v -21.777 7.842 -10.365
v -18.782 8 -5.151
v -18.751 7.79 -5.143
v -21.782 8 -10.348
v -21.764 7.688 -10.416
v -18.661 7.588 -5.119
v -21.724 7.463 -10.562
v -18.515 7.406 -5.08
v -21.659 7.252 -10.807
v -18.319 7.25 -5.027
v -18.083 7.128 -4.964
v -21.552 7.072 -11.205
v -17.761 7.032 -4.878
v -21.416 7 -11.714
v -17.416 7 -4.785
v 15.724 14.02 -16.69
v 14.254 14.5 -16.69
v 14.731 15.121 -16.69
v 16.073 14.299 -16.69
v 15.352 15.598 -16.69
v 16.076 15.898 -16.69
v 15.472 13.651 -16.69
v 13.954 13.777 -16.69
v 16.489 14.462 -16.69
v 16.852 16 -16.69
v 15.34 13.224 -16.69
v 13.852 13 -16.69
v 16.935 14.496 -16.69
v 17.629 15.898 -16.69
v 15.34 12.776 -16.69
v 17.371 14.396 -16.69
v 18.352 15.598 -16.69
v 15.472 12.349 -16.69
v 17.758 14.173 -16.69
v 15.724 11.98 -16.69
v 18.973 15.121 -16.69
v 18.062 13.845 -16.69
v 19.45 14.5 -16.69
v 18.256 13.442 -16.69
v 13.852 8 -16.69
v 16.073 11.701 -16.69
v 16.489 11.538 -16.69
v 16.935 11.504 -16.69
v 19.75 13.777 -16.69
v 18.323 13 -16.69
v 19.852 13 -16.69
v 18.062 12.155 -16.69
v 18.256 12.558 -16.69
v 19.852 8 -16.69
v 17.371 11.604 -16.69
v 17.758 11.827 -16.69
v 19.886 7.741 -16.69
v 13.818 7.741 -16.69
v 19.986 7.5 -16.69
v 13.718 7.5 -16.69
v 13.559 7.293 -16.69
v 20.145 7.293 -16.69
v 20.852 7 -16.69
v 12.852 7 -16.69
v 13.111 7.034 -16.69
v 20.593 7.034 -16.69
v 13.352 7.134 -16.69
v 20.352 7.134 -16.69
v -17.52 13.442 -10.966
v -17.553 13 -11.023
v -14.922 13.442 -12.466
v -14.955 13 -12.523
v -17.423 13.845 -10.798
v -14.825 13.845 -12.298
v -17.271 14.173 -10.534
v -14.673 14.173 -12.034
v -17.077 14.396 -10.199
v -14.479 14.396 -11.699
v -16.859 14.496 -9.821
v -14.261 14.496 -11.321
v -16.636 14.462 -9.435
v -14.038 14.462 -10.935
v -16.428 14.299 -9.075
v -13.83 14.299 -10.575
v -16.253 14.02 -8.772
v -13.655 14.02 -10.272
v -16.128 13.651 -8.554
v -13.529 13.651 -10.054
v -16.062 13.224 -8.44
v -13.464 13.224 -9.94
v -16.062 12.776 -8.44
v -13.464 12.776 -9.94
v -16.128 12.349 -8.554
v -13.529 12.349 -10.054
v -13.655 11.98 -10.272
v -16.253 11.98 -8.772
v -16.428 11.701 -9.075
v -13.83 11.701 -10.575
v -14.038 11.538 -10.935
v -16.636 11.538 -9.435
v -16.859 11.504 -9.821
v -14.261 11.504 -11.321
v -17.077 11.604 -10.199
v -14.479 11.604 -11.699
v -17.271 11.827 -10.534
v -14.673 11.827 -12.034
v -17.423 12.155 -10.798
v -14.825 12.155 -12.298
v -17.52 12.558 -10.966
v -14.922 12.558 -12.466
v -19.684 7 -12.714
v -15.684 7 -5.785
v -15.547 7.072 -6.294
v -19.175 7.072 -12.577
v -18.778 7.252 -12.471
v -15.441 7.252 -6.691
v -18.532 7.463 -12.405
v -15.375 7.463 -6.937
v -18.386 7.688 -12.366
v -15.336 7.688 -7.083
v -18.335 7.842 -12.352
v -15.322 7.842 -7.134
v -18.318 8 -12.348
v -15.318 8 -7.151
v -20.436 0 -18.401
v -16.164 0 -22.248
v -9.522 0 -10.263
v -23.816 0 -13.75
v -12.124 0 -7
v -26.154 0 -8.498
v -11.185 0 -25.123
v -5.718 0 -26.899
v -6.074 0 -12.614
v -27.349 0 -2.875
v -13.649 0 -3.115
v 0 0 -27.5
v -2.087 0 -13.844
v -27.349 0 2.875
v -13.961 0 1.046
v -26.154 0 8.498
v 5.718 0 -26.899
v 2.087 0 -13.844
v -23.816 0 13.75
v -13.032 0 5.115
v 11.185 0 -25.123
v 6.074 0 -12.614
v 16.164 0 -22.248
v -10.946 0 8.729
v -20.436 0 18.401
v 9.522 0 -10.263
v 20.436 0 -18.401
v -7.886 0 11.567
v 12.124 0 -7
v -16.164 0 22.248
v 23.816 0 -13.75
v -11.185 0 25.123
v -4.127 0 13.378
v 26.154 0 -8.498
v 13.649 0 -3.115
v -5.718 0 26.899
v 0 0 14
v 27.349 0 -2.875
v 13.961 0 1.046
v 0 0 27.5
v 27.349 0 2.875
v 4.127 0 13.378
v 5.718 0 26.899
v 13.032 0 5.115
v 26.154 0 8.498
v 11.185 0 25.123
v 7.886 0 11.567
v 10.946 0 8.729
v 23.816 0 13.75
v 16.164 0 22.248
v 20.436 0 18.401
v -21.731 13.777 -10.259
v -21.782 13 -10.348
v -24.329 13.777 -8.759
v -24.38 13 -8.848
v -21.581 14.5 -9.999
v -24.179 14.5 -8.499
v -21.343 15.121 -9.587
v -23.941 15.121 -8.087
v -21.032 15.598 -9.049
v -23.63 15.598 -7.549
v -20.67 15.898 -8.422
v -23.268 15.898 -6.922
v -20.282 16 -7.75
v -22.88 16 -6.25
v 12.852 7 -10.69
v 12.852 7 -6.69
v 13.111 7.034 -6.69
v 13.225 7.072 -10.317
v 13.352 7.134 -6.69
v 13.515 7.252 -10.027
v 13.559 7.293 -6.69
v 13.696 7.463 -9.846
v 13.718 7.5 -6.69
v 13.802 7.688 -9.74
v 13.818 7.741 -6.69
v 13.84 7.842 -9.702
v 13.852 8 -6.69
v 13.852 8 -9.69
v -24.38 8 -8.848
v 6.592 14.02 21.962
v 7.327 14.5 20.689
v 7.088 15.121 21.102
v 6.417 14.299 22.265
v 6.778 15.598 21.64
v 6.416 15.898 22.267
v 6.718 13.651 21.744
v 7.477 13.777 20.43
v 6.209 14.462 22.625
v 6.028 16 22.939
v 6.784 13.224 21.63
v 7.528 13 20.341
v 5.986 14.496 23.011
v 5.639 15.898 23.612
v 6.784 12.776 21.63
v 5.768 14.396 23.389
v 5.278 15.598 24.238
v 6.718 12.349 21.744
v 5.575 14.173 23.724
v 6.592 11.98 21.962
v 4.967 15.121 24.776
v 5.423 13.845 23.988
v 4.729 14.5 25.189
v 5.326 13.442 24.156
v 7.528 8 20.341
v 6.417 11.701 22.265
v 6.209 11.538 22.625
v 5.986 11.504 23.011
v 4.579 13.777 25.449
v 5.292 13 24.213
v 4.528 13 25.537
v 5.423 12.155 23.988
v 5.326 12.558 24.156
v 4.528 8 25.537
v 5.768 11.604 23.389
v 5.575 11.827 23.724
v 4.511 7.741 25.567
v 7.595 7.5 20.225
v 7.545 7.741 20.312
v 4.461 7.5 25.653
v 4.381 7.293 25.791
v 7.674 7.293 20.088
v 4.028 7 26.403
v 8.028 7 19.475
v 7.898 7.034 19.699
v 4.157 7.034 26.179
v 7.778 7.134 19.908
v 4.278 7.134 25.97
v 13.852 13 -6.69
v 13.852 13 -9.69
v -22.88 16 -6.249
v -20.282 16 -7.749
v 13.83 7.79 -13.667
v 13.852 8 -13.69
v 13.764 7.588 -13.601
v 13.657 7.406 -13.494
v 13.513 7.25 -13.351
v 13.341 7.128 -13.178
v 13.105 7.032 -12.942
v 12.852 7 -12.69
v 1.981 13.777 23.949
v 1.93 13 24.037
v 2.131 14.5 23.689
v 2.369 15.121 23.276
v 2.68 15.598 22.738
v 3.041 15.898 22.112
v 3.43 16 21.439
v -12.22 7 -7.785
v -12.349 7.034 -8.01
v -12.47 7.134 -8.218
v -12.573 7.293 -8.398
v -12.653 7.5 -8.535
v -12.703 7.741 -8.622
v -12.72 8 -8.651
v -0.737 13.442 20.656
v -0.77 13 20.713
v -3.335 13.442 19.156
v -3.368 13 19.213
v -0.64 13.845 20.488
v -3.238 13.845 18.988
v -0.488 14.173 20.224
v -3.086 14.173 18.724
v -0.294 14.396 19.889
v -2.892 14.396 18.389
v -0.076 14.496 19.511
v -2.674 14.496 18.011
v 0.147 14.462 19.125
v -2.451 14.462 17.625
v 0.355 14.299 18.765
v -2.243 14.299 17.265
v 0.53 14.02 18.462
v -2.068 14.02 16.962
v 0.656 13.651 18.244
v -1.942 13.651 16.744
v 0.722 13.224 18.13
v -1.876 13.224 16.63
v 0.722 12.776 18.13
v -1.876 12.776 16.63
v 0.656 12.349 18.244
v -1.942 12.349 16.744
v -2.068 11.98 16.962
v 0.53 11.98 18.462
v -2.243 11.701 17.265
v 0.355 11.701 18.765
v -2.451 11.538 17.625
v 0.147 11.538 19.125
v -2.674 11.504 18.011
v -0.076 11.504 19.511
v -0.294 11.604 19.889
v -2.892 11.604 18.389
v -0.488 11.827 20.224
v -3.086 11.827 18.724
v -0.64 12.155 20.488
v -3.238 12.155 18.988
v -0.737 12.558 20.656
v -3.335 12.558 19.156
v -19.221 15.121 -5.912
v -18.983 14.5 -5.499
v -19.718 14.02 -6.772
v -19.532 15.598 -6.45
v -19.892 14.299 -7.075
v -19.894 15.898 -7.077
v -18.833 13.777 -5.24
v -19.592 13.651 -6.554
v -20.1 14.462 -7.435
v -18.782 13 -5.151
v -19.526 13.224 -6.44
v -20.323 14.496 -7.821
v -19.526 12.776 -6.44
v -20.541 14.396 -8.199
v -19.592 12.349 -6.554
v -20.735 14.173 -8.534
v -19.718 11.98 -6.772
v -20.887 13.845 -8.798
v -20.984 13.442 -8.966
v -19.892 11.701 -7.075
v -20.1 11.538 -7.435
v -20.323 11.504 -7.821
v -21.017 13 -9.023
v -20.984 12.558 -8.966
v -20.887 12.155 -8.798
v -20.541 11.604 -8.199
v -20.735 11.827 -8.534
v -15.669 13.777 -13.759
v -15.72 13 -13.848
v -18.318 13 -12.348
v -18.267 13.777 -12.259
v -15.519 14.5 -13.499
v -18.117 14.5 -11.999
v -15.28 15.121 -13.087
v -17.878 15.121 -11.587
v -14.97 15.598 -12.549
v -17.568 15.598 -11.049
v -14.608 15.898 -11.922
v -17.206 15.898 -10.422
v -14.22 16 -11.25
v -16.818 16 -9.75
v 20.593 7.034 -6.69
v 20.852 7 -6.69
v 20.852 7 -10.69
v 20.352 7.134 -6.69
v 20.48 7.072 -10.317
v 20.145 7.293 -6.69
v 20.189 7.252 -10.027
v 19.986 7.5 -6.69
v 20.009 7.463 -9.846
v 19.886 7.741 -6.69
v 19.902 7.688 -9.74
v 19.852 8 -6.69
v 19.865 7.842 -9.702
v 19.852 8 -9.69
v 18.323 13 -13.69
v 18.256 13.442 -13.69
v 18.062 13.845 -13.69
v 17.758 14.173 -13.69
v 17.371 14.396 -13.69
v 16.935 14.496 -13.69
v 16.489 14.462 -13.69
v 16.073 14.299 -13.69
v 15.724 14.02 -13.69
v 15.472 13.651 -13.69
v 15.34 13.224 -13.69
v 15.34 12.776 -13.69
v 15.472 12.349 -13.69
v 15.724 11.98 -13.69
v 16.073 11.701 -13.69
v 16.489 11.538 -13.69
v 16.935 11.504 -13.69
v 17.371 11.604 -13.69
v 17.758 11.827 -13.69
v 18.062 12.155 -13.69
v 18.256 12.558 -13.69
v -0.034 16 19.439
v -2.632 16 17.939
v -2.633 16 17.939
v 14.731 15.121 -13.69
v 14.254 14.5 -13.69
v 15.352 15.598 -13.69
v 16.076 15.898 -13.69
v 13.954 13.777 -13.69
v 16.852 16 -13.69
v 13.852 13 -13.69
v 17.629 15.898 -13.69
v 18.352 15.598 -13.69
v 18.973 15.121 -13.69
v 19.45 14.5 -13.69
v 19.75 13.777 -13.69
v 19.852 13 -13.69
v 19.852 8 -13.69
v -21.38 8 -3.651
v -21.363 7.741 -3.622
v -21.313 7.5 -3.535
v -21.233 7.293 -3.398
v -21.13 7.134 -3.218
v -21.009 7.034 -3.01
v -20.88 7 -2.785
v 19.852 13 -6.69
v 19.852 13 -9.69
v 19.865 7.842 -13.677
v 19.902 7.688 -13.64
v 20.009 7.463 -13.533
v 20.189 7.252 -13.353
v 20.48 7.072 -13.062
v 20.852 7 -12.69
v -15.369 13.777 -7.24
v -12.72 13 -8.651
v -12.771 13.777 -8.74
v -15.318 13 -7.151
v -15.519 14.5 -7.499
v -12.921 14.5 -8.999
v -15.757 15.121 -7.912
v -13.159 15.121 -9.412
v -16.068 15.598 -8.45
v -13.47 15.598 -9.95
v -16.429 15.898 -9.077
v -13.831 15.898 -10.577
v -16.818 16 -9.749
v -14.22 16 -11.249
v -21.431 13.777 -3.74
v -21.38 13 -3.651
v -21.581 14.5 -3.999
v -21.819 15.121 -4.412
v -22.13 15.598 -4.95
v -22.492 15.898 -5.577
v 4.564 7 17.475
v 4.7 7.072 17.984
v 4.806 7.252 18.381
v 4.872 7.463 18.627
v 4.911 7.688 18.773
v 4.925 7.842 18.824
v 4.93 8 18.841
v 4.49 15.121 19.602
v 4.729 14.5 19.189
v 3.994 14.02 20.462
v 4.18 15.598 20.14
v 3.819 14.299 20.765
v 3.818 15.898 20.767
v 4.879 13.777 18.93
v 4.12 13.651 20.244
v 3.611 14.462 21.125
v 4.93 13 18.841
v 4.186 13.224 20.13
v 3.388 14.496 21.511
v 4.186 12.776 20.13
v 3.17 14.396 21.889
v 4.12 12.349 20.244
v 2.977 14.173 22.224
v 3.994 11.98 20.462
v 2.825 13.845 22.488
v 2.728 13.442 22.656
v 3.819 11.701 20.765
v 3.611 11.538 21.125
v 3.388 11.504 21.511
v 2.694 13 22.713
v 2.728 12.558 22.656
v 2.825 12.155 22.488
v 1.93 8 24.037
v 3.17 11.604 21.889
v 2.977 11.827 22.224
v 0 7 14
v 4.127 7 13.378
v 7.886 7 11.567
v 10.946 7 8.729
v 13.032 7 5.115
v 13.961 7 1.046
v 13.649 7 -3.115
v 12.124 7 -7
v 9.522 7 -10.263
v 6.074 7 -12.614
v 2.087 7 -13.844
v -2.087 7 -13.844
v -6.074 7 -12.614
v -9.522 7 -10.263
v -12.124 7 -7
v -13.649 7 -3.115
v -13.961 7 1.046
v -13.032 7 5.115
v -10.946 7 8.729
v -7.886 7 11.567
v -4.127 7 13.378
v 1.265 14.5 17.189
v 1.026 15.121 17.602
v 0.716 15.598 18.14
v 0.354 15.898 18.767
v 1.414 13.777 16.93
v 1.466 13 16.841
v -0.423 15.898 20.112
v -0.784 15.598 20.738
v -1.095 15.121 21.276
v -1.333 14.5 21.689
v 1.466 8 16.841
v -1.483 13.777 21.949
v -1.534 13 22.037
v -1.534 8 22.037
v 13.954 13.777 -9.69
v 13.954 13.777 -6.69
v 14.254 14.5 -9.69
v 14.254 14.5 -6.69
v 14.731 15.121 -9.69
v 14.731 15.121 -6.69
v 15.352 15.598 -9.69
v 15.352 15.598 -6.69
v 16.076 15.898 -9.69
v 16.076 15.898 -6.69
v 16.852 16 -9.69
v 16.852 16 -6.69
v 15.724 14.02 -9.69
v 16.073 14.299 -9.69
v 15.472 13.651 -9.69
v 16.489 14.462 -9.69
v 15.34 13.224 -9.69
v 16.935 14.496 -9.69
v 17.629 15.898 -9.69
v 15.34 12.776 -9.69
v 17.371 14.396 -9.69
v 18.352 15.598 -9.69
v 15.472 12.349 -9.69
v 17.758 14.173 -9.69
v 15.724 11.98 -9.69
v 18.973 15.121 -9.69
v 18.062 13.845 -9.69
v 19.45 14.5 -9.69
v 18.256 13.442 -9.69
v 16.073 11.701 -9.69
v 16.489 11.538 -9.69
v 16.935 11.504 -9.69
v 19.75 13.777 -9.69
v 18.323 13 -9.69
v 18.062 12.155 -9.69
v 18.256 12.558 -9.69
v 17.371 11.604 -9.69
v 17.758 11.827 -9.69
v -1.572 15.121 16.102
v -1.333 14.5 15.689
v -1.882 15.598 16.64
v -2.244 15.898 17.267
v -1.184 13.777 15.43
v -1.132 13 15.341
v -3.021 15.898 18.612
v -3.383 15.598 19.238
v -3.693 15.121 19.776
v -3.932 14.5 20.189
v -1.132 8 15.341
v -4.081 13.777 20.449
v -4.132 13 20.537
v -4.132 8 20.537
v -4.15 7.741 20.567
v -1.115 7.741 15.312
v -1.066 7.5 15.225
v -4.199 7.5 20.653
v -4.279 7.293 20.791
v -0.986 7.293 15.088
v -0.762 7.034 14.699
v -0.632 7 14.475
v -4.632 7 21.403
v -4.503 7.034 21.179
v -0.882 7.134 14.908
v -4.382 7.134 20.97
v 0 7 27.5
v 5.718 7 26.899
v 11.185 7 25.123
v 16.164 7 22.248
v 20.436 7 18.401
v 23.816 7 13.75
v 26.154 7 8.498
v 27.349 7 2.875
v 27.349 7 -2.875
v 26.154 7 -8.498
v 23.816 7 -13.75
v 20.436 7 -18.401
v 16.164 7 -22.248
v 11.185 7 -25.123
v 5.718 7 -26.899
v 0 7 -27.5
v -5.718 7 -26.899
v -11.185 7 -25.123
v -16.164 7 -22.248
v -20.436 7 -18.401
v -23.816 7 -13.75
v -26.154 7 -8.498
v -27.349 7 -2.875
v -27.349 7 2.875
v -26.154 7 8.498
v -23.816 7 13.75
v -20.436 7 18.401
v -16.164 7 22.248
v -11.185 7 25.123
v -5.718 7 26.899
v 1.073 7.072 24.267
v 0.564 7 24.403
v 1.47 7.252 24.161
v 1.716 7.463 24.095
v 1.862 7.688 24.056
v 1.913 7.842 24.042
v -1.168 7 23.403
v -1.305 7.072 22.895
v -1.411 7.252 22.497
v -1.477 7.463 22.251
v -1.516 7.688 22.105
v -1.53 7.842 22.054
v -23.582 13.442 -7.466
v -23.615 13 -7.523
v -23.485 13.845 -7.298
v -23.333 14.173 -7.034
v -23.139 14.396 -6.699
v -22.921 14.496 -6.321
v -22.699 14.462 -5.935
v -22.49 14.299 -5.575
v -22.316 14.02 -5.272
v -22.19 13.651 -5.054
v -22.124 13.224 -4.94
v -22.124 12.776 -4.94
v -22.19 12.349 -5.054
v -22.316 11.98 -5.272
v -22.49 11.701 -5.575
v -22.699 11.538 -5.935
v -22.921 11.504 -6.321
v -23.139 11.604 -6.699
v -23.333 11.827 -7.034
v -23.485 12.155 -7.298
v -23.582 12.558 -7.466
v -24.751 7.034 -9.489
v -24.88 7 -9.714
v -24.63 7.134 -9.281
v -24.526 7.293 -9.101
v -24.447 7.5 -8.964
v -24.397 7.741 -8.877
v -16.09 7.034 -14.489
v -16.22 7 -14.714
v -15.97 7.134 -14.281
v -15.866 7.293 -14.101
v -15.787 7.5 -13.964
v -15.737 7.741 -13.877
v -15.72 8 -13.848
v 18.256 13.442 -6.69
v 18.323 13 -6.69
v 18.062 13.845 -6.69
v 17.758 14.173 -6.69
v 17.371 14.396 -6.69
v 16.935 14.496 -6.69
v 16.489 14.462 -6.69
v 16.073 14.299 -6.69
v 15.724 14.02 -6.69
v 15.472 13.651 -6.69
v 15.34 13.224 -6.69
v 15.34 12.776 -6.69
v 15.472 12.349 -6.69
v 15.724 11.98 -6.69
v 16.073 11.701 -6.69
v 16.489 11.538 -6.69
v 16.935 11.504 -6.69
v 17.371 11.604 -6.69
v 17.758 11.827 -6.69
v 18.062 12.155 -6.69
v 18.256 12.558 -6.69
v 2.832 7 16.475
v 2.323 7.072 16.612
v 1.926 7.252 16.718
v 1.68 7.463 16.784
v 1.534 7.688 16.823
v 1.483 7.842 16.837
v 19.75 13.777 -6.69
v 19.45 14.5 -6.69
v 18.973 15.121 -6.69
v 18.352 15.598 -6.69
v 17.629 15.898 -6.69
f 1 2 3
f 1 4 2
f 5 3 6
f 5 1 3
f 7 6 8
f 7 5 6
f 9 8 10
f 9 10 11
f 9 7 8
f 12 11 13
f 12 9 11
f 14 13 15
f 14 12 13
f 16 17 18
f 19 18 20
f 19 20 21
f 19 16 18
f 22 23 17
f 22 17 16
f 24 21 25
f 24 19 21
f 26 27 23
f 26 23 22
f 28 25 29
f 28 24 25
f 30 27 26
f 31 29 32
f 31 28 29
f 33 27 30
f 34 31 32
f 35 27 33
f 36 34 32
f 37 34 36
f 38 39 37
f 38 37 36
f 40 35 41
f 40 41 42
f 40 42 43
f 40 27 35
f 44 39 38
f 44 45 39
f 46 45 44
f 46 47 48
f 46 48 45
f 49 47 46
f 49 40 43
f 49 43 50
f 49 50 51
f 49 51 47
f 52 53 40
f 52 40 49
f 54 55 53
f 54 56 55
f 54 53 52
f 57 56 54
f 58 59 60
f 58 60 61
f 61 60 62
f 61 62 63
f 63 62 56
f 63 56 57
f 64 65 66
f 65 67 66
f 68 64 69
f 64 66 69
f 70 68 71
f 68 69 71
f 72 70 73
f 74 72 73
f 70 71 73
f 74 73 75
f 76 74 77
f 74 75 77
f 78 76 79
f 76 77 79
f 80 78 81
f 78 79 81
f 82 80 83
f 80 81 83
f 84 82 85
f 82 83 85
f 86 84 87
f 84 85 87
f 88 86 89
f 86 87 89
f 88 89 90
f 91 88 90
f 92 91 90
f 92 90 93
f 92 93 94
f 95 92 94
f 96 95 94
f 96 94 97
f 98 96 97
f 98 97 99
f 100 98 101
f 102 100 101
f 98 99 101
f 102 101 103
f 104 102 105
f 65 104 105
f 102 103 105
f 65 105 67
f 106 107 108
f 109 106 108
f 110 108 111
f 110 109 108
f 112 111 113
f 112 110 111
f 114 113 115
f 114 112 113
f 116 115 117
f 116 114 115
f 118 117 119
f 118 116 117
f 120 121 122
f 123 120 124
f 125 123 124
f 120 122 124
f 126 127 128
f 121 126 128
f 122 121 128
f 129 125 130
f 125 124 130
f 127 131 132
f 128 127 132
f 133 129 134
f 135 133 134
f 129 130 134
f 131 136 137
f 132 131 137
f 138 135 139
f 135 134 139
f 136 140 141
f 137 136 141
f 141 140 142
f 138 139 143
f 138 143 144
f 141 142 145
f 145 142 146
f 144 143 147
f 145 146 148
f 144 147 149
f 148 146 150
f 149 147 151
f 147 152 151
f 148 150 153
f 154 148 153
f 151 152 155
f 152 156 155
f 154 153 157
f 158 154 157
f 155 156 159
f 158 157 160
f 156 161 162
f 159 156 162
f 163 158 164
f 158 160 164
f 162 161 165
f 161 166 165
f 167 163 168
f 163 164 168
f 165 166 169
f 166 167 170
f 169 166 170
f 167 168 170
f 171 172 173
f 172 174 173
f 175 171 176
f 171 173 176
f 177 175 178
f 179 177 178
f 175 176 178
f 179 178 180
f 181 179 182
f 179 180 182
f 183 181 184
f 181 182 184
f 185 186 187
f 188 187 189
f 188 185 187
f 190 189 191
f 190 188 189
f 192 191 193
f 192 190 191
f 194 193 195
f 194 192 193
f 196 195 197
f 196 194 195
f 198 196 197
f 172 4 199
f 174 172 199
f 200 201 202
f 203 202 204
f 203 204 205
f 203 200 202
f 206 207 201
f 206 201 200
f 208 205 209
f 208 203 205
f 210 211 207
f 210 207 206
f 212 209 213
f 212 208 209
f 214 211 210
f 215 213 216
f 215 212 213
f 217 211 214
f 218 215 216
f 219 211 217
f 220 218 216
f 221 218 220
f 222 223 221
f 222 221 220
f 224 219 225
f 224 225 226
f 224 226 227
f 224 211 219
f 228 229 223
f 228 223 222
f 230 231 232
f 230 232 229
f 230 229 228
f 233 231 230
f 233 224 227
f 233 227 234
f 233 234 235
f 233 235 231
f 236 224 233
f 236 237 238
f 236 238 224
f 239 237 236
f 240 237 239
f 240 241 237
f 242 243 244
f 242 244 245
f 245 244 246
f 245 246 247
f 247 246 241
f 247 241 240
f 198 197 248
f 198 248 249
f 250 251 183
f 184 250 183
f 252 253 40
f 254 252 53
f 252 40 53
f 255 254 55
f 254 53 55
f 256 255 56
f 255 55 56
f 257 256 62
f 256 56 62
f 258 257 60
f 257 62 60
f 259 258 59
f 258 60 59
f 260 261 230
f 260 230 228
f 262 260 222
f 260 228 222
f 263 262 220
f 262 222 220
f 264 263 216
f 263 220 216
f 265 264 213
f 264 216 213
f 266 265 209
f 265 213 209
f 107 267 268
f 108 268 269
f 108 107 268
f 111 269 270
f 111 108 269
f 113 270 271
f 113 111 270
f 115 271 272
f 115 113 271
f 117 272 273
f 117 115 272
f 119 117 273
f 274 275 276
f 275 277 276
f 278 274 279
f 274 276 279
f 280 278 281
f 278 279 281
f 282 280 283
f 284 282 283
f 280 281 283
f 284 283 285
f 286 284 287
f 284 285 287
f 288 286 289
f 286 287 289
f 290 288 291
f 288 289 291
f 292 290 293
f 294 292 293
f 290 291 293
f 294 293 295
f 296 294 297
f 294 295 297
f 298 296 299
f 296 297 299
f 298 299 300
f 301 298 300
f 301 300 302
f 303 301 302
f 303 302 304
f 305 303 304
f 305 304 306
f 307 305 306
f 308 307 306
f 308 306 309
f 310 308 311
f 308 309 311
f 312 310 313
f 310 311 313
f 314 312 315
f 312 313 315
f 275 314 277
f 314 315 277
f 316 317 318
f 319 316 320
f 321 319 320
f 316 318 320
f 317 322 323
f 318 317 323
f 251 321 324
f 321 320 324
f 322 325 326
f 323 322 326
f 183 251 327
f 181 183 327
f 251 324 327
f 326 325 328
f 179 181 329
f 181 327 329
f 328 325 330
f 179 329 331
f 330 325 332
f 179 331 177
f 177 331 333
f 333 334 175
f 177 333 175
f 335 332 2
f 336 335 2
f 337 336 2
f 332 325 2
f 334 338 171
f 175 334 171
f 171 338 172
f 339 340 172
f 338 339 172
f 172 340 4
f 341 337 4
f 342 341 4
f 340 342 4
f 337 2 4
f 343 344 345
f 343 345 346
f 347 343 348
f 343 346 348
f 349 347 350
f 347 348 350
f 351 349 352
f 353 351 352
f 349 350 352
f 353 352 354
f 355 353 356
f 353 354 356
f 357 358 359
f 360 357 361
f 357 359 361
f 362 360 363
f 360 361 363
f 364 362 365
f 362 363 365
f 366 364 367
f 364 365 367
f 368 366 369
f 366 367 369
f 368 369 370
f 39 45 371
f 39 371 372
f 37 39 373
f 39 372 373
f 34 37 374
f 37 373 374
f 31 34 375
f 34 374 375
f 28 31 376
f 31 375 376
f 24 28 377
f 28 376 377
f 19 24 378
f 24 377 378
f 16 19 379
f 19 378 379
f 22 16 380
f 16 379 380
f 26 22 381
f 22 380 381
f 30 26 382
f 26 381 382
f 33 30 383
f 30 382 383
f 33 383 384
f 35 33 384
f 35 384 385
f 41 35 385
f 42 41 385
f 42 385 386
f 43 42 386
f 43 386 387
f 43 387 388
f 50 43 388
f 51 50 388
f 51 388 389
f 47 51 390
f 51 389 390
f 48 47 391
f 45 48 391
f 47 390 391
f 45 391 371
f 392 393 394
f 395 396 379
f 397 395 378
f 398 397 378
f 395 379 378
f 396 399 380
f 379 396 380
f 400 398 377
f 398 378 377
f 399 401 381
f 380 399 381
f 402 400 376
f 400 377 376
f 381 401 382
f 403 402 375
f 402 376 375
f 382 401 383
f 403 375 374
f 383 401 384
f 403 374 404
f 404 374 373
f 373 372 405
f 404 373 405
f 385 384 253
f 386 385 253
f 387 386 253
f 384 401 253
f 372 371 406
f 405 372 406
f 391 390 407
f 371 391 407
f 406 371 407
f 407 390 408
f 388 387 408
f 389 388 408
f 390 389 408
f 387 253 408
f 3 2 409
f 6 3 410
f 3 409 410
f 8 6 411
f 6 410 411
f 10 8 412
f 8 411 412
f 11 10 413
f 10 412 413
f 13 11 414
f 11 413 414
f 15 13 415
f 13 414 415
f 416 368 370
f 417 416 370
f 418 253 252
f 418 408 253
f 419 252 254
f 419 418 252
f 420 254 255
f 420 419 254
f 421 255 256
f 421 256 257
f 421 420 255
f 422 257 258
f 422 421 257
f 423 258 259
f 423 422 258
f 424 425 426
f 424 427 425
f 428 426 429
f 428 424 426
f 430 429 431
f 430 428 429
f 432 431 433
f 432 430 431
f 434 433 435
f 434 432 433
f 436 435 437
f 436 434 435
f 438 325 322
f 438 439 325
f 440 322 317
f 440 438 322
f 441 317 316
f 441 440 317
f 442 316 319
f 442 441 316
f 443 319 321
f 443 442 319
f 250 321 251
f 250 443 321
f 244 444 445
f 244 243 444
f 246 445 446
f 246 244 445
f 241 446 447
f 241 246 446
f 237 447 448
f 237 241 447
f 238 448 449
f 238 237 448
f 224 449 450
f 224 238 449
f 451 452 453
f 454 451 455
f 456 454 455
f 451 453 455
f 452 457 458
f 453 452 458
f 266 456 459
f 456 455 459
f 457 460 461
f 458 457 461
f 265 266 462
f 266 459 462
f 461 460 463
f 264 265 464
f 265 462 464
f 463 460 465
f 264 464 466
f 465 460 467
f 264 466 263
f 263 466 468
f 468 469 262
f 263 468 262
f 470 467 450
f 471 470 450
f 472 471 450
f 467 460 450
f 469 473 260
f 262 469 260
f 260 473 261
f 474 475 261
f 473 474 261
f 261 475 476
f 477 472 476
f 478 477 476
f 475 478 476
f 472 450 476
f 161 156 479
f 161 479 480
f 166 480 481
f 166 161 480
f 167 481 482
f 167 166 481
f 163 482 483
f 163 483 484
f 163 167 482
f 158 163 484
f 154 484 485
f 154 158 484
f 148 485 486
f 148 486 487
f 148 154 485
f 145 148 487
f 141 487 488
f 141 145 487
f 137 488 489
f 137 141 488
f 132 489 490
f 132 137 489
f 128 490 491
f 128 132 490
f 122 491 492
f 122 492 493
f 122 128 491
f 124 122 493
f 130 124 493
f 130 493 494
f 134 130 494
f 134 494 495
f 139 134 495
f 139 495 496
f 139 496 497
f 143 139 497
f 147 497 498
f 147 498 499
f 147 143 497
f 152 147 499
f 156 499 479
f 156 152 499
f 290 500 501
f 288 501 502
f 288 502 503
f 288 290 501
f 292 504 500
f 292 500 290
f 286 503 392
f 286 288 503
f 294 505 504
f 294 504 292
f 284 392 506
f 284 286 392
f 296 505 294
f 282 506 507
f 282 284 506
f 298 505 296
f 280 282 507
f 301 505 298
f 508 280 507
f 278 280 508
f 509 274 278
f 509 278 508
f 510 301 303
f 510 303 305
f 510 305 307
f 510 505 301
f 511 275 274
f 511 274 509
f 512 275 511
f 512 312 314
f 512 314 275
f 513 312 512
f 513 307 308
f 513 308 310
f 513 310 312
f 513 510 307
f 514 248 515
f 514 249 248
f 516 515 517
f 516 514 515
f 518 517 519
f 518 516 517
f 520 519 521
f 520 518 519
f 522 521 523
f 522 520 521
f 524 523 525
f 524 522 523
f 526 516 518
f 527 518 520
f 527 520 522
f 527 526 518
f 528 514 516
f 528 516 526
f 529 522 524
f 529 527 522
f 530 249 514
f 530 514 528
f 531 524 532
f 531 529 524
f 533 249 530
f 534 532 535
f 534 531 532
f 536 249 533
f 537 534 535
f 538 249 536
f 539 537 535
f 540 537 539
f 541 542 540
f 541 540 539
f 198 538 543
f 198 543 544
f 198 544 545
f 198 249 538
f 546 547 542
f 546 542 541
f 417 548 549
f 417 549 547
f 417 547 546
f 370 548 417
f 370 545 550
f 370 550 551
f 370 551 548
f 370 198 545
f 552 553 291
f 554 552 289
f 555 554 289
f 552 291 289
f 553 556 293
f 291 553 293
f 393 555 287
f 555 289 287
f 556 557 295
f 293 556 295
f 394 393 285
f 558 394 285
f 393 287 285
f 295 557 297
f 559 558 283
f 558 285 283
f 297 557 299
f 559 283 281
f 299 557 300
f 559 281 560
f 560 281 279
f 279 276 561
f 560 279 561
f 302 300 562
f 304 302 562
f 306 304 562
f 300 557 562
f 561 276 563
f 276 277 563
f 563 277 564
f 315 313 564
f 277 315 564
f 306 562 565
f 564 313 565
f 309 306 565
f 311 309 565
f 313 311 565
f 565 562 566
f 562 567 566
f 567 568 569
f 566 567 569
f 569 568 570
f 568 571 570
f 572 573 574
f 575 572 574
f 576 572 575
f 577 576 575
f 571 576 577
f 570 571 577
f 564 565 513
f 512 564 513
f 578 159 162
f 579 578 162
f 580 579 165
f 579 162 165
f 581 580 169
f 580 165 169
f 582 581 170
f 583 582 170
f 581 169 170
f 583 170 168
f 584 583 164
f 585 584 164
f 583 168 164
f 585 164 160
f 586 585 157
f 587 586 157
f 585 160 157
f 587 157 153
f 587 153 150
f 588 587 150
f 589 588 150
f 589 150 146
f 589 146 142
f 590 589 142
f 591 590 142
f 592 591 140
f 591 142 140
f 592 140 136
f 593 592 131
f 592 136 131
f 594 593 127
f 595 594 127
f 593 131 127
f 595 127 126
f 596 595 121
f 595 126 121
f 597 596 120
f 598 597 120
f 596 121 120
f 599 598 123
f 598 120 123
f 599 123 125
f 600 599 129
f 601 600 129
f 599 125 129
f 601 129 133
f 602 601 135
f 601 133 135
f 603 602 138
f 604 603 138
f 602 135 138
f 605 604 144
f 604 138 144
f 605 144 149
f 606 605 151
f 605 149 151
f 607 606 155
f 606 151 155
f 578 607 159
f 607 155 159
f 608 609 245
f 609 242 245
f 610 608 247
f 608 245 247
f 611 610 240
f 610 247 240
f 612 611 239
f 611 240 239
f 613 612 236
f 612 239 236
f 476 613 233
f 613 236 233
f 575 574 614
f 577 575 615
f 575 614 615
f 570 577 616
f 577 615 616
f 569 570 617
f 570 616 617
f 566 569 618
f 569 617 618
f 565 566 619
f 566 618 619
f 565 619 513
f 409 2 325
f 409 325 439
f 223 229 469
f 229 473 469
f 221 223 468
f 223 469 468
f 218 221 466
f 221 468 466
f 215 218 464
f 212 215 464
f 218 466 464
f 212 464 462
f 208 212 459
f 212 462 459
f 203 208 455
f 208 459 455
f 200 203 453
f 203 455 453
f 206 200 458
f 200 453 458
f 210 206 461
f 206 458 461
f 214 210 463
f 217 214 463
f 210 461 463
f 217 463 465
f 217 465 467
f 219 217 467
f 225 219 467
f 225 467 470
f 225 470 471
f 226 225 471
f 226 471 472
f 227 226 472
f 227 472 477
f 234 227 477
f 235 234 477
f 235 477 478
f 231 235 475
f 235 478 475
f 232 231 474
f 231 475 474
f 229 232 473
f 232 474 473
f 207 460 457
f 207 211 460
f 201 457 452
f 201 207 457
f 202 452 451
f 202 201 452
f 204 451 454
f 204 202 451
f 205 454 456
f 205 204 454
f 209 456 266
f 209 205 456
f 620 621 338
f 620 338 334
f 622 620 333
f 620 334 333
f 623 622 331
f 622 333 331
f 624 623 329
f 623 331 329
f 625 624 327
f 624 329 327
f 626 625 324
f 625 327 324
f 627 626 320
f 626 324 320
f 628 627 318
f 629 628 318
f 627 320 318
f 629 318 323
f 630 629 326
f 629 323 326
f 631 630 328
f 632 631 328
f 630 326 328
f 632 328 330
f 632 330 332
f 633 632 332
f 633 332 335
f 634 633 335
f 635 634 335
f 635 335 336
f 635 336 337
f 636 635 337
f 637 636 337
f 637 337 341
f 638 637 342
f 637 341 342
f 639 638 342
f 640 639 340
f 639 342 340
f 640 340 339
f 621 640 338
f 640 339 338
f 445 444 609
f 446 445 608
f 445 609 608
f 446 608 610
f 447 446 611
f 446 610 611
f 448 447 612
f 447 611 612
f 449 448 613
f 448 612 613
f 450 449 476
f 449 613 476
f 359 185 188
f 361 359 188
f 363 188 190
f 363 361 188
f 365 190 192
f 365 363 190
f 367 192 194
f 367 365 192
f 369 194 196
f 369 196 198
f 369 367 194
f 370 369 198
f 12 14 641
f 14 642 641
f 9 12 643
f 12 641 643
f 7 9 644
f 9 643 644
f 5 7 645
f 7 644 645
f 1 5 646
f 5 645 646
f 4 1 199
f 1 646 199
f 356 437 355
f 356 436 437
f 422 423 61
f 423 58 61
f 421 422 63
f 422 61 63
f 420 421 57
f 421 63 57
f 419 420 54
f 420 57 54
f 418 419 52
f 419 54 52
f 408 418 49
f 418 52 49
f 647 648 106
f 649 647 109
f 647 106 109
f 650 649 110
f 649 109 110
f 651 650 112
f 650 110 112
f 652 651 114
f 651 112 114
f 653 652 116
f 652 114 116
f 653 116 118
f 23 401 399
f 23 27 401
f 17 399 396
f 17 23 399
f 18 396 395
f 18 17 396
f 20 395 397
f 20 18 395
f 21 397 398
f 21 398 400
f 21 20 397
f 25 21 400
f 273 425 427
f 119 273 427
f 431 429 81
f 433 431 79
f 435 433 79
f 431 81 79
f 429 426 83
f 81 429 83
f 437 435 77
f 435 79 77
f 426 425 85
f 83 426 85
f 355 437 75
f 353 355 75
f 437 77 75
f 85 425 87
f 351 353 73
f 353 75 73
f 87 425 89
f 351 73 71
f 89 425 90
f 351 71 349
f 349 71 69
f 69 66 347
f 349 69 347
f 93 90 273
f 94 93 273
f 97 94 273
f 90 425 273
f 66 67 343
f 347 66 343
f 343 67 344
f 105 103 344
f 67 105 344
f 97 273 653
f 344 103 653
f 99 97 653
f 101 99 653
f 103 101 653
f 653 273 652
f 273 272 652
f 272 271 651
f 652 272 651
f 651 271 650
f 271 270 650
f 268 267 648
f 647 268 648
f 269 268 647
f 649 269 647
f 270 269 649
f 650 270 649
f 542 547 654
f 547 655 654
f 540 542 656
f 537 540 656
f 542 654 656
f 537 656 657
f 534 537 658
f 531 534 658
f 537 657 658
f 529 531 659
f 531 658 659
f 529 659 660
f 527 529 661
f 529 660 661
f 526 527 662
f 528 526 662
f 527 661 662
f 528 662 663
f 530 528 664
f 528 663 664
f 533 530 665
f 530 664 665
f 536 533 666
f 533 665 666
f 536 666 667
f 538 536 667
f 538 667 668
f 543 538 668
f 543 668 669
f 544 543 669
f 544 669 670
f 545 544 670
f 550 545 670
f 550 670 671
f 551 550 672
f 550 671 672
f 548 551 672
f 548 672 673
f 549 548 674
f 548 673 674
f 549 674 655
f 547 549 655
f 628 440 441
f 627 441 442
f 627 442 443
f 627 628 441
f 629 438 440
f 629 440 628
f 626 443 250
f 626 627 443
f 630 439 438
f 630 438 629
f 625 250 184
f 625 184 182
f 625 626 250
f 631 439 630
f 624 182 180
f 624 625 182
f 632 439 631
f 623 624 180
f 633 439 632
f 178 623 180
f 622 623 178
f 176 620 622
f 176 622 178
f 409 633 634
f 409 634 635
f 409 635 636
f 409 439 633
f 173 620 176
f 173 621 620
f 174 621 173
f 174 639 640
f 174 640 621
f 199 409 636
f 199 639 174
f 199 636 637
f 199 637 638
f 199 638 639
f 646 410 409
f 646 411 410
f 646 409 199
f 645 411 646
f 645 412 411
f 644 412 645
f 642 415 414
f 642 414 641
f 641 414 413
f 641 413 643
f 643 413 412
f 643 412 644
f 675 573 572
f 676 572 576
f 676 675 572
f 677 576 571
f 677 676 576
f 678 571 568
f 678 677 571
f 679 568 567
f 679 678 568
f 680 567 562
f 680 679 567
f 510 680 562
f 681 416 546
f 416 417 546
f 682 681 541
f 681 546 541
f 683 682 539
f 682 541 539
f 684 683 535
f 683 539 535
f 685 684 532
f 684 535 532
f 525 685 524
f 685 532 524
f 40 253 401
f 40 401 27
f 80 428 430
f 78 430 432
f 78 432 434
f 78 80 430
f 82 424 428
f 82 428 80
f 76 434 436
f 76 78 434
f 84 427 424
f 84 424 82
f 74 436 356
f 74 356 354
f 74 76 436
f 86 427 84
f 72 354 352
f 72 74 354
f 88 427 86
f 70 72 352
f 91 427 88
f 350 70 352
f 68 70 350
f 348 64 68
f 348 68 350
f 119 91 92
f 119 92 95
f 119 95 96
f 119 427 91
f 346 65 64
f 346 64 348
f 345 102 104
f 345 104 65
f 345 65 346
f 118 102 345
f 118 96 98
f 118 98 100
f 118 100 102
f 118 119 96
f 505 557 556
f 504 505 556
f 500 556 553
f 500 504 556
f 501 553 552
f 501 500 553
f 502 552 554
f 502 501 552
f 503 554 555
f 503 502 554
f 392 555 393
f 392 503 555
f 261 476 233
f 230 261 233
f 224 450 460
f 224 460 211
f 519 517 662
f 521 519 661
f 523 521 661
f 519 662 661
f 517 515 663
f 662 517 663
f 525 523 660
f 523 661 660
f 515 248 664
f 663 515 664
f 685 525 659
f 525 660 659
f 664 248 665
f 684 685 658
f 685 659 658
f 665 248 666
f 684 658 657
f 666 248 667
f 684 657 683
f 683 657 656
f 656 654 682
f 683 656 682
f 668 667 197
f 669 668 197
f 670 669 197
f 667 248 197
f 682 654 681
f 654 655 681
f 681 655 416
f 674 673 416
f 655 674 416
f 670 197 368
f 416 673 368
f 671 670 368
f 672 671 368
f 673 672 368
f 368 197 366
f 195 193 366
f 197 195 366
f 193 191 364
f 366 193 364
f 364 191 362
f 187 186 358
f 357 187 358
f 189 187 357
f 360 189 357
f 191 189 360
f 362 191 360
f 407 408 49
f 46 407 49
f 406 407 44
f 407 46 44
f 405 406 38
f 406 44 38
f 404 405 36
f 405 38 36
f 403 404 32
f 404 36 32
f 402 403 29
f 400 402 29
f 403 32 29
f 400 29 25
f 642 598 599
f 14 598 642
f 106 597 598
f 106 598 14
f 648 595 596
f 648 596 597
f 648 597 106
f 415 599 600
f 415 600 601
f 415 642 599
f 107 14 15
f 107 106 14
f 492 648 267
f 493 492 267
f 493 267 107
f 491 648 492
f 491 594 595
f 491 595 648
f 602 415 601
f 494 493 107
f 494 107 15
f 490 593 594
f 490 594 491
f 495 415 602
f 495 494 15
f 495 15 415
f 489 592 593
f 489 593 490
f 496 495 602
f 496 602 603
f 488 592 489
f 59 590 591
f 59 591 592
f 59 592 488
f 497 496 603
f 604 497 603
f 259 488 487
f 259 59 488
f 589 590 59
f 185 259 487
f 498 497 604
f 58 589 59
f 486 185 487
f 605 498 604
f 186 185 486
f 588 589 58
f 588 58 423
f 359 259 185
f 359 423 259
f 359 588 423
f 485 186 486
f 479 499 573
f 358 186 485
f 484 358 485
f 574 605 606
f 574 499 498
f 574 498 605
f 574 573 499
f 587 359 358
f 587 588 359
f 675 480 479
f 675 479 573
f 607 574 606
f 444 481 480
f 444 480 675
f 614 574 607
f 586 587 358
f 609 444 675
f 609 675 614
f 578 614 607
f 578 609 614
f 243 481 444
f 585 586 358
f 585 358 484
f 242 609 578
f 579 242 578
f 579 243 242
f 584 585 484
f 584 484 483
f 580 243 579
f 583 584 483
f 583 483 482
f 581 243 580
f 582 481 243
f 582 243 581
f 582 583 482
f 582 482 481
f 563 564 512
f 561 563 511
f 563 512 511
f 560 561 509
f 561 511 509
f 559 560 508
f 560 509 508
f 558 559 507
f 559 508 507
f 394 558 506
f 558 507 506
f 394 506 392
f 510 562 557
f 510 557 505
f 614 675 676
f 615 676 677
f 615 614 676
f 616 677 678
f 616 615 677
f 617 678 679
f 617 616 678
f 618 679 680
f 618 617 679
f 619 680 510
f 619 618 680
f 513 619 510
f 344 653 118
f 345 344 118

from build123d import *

# Parameters (mm, degrees)
SKETCH1_R                = 27.5
SKETCH1_R_2              = 14
BOSS_EXTRUDE1_DEPTH      = 7
SKETCH3_W                = 6
SKETCH3_H                = 3
BOSS_EXTRUDE2_DEPTH      = 9
FILLET1_R                = 3
FILLET2_R                = 1
SKETCH5_R                = 1.5
CUT_EXTRUDE2_DEPTH       = 47.703277471
CIRPATTERN2_COUNT        = 3
FILLET1_OF_CIRPATTERN2_R = 3
FILLET2_OF_CIRPATTERN2_R = 1


with BuildPart() as part:
    # Sketch1 → Boss-Extrude1 (new body)
    with BuildSketch(Plane(origin=(0, 0, 0), x_dir=(1, 0, 0), z_dir=(0, 1, 0))):
        with Locations(Location((0, 0, 0), (0, 0, 270))):
            Circle(SKETCH1_R)
        with Locations(Location((0, 0, 0), (0, 0, 270))):
            Circle(SKETCH1_R_2, mode=Mode.SUBTRACT)
    extrude(amount=BOSS_EXTRUDE1_DEPTH)

    # Sketch3 → Boss-Extrude2 (add)
    with BuildSketch(Plane(origin=(0, 7, 0), x_dir=(1, 0, 0), z_dir=(0, 1, 0))):
        with Locations((16.852148123, 8.189854147)):
            Rectangle(SKETCH3_W, SKETCH3_H)
        with Locations((16.852148123, 15.189854147)):
            Rectangle(SKETCH3_W, SKETCH3_H)
    boss_extrude2 = extrude(amount=BOSS_EXTRUDE2_DEPTH)

    # Fillet1
    fillet1_edges = [part.edges().sort_by_distance(p)[0] for p in [
        (19.852148123, 16, -8.189854147),
        (13.852148123, 16, -8.189854147),
        (13.852148123, 16, -15.189854147),
        (19.852148123, 16, -15.189854147),
    ]]
    fillet(fillet1_edges, radius=FILLET1_R - 0.0001)  # a hair under: the kernel refuses the full size

    # Fillet2
    fillet2_edges = [part.edges().sort_by_distance(p)[0] for p in [
        (19.852148123, 7, -8.189854147),
        (16.852148123, 7, -9.689854147),
        (13.852148123, 7, -8.189854147),
        (19.852148123, 7, -15.189854147),
        (13.852148123, 7, -15.189854147),
        (16.852148123, 7, -13.689854147),
    ]]
    fillet(fillet2_edges, radius=FILLET2_R)

    # Sketch5 → Cut-Extrude2 (cut, symmetric)
    with BuildSketch(Plane.XY.offset(-6.689854147)):
        with Locations((16.823138997, 13)):
            Circle(SKETCH5_R)
    cut_extrude2 = extrude(amount=CUT_EXTRUDE2_DEPTH, both=True, mode=Mode.SUBTRACT)

    # CirPattern2: Boss-Extrude2, Cut-Extrude2 ×3 about axis
    cirpattern2_axis = Axis((0, 0, 0), (0, 1, 0))
    add([boss_extrude2.rotate(cirpattern2_axis, i * 360 / CIRPATTERN2_COUNT) for i in range(1, CIRPATTERN2_COUNT)])
    add([cut_extrude2.rotate(cirpattern2_axis, i * 360 / CIRPATTERN2_COUNT) for i in range(1, CIRPATTERN2_COUNT)], mode=Mode.SUBTRACT)

    # Fillet1 of CirPattern2
    fillet1_of_cirpattern2_edges = [part.edges().sort_by_distance(p)[0] for p in [
        (-17.018695806, 16, -13.097537521),
        (-14.018695806, 16, -7.901385098),
        (-20.080873632, 16, -4.401385098),
        (-23.080873632, 16, -9.597537521),
        (-2.833452317, 16, 21.287391668),
        (0.166547683, 16, 16.091239245),
        (6.228725509, 16, 19.591239245),
        (3.228725509, 16, 24.787391668),
    ]]
    fillet(fillet1_of_cirpattern2_edges, radius=FILLET1_OF_CIRPATTERN2_R - 0.0001)  # a hair under: the kernel refuses the full size

    # Fillet2 of CirPattern2
    fillet2_of_cirpattern2_edges = [part.edges().sort_by_distance(p)[0] for p in [
        (-17.018695806, 7, -13.097537521),
        (-16.817733912, 7, -9.749461309),
        (-14.018695806, 7, -7.901385098),
        (-23.080873632, 7, -9.597537521),
        (-20.080873632, 7, -4.401385098),
        (-20.281835527, 7, -7.749461309),
        (-2.833452317, 7, 21.287391668),
        (-0.034414211, 7, 19.439315456),
        (0.166547683, 7, 16.091239245),
        (3.228725509, 7, 24.787391668),
        (6.228725509, 7, 19.591239245),
        (3.429687404, 7, 21.439315456),
    ]]
    fillet(fillet2_of_cirpattern2_edges, radius=FILLET2_OF_CIRPATTERN2_R)


solid = part.part
